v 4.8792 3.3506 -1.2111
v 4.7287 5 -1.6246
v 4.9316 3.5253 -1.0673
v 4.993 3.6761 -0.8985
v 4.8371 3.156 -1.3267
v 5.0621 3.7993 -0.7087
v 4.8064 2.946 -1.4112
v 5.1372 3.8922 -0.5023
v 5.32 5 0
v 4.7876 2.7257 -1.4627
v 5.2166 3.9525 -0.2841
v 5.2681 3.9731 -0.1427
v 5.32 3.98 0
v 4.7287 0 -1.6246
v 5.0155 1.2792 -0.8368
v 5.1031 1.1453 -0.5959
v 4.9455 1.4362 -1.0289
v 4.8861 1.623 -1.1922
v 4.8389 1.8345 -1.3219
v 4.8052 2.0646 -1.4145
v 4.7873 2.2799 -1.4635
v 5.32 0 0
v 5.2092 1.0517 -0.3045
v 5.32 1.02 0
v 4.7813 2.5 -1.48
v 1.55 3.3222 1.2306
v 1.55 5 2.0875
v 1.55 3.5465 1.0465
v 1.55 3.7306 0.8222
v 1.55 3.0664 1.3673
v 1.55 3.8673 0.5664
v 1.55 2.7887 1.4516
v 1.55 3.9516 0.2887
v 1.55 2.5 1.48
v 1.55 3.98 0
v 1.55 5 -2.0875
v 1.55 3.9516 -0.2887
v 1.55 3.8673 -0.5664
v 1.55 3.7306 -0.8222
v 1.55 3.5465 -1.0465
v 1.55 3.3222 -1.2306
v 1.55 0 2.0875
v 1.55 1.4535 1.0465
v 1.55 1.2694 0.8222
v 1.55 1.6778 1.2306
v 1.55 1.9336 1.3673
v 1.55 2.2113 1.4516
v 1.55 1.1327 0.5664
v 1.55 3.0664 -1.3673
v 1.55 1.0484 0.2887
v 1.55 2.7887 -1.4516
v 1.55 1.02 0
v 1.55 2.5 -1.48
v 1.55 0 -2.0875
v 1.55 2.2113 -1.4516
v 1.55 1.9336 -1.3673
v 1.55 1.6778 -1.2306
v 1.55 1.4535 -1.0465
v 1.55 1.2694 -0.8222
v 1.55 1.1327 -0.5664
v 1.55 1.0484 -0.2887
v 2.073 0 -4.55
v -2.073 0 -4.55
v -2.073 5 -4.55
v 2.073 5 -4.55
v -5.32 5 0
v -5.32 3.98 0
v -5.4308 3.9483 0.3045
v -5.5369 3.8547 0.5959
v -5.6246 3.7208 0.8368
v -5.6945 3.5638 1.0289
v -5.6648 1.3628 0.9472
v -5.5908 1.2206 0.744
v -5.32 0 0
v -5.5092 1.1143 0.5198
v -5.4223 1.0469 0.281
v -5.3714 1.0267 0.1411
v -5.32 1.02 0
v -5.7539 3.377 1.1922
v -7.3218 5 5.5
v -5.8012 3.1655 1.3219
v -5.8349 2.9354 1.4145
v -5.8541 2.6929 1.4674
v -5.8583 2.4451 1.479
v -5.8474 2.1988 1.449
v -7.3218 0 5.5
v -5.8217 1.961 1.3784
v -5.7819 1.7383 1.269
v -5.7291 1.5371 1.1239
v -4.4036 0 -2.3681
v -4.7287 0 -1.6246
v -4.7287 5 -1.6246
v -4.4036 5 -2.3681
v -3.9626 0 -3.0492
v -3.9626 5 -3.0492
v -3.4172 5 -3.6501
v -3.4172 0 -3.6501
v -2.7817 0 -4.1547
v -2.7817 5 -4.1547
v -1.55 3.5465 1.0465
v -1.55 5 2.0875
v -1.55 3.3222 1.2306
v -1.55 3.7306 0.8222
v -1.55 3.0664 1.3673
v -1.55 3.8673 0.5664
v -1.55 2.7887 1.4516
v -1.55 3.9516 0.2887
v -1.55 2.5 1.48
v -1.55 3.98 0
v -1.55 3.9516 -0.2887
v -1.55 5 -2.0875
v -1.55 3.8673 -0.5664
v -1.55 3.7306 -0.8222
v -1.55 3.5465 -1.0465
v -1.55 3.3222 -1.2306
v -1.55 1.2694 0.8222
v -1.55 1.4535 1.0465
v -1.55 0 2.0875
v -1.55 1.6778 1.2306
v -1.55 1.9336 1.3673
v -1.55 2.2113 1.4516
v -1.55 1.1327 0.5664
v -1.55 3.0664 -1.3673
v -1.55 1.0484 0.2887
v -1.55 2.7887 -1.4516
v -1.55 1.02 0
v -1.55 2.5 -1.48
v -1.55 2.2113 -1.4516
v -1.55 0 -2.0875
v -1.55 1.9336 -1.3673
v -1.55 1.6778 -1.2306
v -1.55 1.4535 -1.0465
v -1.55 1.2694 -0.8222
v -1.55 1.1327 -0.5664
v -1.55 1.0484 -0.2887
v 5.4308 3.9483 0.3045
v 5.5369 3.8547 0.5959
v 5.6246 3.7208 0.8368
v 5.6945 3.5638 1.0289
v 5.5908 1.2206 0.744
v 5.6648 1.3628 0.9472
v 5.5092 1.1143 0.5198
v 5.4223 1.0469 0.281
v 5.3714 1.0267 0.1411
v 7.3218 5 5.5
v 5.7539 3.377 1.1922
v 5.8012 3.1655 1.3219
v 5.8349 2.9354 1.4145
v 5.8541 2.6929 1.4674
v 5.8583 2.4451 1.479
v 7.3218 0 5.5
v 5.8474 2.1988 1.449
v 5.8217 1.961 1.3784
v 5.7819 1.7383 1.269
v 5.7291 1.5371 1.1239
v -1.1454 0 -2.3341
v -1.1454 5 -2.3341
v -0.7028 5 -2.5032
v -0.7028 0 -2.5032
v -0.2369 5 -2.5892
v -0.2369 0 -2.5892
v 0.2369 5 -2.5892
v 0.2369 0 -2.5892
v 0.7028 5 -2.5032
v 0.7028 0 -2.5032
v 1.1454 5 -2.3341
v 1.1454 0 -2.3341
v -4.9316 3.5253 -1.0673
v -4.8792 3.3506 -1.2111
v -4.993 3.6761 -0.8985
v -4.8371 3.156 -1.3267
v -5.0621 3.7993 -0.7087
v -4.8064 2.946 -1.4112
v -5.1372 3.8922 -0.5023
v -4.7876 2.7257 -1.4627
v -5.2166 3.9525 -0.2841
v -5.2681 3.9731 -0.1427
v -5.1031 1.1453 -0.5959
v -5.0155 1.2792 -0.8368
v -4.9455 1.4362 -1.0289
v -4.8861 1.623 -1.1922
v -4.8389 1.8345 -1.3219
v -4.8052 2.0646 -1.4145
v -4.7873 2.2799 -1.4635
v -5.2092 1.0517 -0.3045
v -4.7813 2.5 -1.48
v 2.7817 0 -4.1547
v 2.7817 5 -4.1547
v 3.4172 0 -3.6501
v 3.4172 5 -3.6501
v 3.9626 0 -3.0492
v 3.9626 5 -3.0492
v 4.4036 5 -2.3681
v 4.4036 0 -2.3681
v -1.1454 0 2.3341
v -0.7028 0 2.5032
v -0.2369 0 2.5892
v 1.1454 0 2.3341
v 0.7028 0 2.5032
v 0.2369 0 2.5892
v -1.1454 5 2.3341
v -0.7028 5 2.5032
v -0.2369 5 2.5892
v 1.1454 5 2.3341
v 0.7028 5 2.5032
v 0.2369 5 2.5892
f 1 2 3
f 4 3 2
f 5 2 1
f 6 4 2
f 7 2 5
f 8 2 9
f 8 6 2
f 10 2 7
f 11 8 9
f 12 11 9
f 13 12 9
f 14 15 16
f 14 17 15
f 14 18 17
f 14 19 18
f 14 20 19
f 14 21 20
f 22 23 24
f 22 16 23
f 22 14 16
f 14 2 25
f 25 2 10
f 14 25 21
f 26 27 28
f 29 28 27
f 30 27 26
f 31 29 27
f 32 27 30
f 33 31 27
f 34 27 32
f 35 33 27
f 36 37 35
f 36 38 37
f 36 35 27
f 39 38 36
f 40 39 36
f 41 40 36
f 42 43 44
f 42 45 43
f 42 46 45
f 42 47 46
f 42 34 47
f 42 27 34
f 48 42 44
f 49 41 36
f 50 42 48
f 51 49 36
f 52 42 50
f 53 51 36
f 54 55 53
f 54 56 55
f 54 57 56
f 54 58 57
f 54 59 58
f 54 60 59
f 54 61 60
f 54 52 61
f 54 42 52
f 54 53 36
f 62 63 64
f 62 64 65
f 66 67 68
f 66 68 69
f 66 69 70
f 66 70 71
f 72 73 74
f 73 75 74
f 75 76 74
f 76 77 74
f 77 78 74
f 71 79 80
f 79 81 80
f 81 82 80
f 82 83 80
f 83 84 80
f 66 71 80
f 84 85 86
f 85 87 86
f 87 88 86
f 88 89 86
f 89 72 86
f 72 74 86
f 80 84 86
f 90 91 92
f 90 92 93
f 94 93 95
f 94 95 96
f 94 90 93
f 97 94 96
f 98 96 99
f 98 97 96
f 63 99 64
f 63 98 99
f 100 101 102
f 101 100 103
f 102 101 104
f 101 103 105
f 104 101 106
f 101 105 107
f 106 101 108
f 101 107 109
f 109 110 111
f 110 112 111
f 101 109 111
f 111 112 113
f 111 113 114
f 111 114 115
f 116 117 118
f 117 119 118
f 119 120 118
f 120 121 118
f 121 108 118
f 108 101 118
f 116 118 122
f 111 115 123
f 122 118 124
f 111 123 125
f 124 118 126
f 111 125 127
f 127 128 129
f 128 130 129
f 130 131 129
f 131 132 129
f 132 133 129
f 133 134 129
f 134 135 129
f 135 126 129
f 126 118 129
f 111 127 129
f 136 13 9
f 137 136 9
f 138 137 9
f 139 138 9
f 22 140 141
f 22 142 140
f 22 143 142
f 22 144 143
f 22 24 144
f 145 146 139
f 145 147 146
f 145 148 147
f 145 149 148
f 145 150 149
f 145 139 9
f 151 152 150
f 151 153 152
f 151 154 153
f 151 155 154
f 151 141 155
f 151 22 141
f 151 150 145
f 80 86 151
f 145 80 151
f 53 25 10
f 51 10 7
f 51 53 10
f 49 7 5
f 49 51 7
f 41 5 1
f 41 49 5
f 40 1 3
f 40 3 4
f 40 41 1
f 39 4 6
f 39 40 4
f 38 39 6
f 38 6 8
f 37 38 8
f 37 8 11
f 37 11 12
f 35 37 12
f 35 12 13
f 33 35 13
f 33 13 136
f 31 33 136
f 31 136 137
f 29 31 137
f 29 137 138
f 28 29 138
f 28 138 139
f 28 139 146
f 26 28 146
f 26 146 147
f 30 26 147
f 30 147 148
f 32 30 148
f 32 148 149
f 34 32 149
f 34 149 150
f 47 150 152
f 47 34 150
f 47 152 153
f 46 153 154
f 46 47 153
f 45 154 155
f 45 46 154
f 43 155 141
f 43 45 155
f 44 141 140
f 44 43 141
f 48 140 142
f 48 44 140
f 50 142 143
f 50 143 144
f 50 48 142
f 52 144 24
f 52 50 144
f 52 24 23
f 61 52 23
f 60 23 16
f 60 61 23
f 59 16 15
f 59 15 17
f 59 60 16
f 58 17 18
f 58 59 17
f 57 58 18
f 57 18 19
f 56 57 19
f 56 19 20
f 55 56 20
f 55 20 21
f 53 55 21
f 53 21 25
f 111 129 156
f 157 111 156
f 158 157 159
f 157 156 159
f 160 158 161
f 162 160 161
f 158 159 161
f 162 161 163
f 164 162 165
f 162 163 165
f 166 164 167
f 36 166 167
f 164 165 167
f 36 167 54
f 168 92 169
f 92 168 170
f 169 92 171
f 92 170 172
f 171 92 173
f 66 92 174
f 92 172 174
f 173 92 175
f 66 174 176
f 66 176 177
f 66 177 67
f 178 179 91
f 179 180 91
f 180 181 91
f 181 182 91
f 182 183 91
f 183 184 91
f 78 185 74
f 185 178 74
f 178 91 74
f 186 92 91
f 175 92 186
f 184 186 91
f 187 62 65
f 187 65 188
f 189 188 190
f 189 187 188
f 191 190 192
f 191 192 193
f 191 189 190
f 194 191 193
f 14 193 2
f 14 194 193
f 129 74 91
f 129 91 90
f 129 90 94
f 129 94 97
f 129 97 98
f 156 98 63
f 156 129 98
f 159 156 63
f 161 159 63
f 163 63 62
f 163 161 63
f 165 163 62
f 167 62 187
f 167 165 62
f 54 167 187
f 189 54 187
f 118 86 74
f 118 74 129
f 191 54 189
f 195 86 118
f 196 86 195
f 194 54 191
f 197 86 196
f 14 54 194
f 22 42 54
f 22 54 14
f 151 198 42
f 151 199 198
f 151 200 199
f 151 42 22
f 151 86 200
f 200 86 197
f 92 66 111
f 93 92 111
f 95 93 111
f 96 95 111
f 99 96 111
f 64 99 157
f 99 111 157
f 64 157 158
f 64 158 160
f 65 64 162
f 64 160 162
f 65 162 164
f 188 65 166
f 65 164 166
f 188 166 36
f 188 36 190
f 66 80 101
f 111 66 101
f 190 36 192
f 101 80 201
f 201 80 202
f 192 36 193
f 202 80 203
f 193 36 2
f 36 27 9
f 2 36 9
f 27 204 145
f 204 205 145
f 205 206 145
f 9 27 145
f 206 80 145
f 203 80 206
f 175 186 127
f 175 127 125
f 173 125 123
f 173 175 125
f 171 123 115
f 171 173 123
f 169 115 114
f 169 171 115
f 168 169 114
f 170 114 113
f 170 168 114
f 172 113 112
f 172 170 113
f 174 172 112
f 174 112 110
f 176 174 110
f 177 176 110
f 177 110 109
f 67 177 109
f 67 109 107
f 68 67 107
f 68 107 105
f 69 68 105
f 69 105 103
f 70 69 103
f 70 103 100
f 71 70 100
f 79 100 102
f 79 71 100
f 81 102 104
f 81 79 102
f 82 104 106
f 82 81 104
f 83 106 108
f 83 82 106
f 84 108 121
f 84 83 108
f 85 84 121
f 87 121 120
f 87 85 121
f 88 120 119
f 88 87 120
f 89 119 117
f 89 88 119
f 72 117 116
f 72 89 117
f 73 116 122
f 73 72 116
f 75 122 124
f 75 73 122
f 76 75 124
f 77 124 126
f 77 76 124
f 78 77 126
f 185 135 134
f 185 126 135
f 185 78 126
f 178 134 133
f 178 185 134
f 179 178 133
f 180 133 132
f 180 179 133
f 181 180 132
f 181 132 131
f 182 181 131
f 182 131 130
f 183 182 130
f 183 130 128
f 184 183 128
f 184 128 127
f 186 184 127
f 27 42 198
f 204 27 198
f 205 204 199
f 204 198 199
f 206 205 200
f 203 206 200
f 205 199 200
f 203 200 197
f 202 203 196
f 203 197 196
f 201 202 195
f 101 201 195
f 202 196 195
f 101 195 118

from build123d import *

# Parameters (mm, degrees)
CYLINDER012_R     = 1.48
CYLINDER012_DEPTH = 12
EXTRUDE008_DEPTH  = 5
EXTRUDE_DEPTH     = 5


with BuildPart() as motorcoupler_couplershaft:
    # Cylinder012 → Cylinder012 (new body)
    with BuildSketch(Plane(origin=(-6, 2.5, 0), x_dir=(0, 0, -1), z_dir=(1, 0, 0))):
        Circle(CYLINDER012_R)
    extrude(amount=CYLINDER012_DEPTH)


with BuildPart() as motorcoupler_motorshaft:
    # Sketch008 → Extrude008 (new body)
    with BuildSketch(Plane(origin=(0, 0, 0), x_dir=(0, 0, -1), z_dir=(0, -1, 0))):
        with BuildLine():
            ThreePointArc((2.087463, -1.55), (2.6, 0), (2.087463, 1.55))
            Line((-2.087463, 1.55), (2.087463, 1.55))
            ThreePointArc((-2.087463, 1.55), (-2.6, 0), (-2.087463, -1.55))
            Line((-2.087463, -1.55), (2.087463, -1.55))
        make_face()
    extrude(amount=-EXTRUDE008_DEPTH)


with BuildPart() as motorcoupler:
    # Sketch007 → Extrude (new body)
    with BuildSketch(Plane.XZ):
        with BuildLine():
            Line((4.728709, -1.624596), (5.320013, 0))
            Line((5.320013, 0), (7.32185, 5.5))
            Line((-7.32185, 5.5), (7.32185, 5.5))
            Line((-5.320013, 0), (-7.32185, 5.5))
            Line((-4.728709, -1.624596), (-5.320013, 0))
            ThreePointArc((-4.728709, -1.624596), (-3.702087, -3.360737), (-2.073041, -4.55))
            Line((-2.073041, -4.55), (2.073041, -4.55))
            ThreePointArc((2.073041, -4.55), (3.702087, -3.360737), (4.728709, -1.624596))
        make_face()
    extrude(amount=-EXTRUDE_DEPTH)

    # Cut017: cut motorCoupler_motorShaft
    add(motorcoupler_motorshaft.part, mode=Mode.SUBTRACT)

    # Cut018: cut motorCoupler_couplerShaft
    add(motorcoupler_couplershaft.part, mode=Mode.SUBTRACT)


solid = motorcoupler.part
